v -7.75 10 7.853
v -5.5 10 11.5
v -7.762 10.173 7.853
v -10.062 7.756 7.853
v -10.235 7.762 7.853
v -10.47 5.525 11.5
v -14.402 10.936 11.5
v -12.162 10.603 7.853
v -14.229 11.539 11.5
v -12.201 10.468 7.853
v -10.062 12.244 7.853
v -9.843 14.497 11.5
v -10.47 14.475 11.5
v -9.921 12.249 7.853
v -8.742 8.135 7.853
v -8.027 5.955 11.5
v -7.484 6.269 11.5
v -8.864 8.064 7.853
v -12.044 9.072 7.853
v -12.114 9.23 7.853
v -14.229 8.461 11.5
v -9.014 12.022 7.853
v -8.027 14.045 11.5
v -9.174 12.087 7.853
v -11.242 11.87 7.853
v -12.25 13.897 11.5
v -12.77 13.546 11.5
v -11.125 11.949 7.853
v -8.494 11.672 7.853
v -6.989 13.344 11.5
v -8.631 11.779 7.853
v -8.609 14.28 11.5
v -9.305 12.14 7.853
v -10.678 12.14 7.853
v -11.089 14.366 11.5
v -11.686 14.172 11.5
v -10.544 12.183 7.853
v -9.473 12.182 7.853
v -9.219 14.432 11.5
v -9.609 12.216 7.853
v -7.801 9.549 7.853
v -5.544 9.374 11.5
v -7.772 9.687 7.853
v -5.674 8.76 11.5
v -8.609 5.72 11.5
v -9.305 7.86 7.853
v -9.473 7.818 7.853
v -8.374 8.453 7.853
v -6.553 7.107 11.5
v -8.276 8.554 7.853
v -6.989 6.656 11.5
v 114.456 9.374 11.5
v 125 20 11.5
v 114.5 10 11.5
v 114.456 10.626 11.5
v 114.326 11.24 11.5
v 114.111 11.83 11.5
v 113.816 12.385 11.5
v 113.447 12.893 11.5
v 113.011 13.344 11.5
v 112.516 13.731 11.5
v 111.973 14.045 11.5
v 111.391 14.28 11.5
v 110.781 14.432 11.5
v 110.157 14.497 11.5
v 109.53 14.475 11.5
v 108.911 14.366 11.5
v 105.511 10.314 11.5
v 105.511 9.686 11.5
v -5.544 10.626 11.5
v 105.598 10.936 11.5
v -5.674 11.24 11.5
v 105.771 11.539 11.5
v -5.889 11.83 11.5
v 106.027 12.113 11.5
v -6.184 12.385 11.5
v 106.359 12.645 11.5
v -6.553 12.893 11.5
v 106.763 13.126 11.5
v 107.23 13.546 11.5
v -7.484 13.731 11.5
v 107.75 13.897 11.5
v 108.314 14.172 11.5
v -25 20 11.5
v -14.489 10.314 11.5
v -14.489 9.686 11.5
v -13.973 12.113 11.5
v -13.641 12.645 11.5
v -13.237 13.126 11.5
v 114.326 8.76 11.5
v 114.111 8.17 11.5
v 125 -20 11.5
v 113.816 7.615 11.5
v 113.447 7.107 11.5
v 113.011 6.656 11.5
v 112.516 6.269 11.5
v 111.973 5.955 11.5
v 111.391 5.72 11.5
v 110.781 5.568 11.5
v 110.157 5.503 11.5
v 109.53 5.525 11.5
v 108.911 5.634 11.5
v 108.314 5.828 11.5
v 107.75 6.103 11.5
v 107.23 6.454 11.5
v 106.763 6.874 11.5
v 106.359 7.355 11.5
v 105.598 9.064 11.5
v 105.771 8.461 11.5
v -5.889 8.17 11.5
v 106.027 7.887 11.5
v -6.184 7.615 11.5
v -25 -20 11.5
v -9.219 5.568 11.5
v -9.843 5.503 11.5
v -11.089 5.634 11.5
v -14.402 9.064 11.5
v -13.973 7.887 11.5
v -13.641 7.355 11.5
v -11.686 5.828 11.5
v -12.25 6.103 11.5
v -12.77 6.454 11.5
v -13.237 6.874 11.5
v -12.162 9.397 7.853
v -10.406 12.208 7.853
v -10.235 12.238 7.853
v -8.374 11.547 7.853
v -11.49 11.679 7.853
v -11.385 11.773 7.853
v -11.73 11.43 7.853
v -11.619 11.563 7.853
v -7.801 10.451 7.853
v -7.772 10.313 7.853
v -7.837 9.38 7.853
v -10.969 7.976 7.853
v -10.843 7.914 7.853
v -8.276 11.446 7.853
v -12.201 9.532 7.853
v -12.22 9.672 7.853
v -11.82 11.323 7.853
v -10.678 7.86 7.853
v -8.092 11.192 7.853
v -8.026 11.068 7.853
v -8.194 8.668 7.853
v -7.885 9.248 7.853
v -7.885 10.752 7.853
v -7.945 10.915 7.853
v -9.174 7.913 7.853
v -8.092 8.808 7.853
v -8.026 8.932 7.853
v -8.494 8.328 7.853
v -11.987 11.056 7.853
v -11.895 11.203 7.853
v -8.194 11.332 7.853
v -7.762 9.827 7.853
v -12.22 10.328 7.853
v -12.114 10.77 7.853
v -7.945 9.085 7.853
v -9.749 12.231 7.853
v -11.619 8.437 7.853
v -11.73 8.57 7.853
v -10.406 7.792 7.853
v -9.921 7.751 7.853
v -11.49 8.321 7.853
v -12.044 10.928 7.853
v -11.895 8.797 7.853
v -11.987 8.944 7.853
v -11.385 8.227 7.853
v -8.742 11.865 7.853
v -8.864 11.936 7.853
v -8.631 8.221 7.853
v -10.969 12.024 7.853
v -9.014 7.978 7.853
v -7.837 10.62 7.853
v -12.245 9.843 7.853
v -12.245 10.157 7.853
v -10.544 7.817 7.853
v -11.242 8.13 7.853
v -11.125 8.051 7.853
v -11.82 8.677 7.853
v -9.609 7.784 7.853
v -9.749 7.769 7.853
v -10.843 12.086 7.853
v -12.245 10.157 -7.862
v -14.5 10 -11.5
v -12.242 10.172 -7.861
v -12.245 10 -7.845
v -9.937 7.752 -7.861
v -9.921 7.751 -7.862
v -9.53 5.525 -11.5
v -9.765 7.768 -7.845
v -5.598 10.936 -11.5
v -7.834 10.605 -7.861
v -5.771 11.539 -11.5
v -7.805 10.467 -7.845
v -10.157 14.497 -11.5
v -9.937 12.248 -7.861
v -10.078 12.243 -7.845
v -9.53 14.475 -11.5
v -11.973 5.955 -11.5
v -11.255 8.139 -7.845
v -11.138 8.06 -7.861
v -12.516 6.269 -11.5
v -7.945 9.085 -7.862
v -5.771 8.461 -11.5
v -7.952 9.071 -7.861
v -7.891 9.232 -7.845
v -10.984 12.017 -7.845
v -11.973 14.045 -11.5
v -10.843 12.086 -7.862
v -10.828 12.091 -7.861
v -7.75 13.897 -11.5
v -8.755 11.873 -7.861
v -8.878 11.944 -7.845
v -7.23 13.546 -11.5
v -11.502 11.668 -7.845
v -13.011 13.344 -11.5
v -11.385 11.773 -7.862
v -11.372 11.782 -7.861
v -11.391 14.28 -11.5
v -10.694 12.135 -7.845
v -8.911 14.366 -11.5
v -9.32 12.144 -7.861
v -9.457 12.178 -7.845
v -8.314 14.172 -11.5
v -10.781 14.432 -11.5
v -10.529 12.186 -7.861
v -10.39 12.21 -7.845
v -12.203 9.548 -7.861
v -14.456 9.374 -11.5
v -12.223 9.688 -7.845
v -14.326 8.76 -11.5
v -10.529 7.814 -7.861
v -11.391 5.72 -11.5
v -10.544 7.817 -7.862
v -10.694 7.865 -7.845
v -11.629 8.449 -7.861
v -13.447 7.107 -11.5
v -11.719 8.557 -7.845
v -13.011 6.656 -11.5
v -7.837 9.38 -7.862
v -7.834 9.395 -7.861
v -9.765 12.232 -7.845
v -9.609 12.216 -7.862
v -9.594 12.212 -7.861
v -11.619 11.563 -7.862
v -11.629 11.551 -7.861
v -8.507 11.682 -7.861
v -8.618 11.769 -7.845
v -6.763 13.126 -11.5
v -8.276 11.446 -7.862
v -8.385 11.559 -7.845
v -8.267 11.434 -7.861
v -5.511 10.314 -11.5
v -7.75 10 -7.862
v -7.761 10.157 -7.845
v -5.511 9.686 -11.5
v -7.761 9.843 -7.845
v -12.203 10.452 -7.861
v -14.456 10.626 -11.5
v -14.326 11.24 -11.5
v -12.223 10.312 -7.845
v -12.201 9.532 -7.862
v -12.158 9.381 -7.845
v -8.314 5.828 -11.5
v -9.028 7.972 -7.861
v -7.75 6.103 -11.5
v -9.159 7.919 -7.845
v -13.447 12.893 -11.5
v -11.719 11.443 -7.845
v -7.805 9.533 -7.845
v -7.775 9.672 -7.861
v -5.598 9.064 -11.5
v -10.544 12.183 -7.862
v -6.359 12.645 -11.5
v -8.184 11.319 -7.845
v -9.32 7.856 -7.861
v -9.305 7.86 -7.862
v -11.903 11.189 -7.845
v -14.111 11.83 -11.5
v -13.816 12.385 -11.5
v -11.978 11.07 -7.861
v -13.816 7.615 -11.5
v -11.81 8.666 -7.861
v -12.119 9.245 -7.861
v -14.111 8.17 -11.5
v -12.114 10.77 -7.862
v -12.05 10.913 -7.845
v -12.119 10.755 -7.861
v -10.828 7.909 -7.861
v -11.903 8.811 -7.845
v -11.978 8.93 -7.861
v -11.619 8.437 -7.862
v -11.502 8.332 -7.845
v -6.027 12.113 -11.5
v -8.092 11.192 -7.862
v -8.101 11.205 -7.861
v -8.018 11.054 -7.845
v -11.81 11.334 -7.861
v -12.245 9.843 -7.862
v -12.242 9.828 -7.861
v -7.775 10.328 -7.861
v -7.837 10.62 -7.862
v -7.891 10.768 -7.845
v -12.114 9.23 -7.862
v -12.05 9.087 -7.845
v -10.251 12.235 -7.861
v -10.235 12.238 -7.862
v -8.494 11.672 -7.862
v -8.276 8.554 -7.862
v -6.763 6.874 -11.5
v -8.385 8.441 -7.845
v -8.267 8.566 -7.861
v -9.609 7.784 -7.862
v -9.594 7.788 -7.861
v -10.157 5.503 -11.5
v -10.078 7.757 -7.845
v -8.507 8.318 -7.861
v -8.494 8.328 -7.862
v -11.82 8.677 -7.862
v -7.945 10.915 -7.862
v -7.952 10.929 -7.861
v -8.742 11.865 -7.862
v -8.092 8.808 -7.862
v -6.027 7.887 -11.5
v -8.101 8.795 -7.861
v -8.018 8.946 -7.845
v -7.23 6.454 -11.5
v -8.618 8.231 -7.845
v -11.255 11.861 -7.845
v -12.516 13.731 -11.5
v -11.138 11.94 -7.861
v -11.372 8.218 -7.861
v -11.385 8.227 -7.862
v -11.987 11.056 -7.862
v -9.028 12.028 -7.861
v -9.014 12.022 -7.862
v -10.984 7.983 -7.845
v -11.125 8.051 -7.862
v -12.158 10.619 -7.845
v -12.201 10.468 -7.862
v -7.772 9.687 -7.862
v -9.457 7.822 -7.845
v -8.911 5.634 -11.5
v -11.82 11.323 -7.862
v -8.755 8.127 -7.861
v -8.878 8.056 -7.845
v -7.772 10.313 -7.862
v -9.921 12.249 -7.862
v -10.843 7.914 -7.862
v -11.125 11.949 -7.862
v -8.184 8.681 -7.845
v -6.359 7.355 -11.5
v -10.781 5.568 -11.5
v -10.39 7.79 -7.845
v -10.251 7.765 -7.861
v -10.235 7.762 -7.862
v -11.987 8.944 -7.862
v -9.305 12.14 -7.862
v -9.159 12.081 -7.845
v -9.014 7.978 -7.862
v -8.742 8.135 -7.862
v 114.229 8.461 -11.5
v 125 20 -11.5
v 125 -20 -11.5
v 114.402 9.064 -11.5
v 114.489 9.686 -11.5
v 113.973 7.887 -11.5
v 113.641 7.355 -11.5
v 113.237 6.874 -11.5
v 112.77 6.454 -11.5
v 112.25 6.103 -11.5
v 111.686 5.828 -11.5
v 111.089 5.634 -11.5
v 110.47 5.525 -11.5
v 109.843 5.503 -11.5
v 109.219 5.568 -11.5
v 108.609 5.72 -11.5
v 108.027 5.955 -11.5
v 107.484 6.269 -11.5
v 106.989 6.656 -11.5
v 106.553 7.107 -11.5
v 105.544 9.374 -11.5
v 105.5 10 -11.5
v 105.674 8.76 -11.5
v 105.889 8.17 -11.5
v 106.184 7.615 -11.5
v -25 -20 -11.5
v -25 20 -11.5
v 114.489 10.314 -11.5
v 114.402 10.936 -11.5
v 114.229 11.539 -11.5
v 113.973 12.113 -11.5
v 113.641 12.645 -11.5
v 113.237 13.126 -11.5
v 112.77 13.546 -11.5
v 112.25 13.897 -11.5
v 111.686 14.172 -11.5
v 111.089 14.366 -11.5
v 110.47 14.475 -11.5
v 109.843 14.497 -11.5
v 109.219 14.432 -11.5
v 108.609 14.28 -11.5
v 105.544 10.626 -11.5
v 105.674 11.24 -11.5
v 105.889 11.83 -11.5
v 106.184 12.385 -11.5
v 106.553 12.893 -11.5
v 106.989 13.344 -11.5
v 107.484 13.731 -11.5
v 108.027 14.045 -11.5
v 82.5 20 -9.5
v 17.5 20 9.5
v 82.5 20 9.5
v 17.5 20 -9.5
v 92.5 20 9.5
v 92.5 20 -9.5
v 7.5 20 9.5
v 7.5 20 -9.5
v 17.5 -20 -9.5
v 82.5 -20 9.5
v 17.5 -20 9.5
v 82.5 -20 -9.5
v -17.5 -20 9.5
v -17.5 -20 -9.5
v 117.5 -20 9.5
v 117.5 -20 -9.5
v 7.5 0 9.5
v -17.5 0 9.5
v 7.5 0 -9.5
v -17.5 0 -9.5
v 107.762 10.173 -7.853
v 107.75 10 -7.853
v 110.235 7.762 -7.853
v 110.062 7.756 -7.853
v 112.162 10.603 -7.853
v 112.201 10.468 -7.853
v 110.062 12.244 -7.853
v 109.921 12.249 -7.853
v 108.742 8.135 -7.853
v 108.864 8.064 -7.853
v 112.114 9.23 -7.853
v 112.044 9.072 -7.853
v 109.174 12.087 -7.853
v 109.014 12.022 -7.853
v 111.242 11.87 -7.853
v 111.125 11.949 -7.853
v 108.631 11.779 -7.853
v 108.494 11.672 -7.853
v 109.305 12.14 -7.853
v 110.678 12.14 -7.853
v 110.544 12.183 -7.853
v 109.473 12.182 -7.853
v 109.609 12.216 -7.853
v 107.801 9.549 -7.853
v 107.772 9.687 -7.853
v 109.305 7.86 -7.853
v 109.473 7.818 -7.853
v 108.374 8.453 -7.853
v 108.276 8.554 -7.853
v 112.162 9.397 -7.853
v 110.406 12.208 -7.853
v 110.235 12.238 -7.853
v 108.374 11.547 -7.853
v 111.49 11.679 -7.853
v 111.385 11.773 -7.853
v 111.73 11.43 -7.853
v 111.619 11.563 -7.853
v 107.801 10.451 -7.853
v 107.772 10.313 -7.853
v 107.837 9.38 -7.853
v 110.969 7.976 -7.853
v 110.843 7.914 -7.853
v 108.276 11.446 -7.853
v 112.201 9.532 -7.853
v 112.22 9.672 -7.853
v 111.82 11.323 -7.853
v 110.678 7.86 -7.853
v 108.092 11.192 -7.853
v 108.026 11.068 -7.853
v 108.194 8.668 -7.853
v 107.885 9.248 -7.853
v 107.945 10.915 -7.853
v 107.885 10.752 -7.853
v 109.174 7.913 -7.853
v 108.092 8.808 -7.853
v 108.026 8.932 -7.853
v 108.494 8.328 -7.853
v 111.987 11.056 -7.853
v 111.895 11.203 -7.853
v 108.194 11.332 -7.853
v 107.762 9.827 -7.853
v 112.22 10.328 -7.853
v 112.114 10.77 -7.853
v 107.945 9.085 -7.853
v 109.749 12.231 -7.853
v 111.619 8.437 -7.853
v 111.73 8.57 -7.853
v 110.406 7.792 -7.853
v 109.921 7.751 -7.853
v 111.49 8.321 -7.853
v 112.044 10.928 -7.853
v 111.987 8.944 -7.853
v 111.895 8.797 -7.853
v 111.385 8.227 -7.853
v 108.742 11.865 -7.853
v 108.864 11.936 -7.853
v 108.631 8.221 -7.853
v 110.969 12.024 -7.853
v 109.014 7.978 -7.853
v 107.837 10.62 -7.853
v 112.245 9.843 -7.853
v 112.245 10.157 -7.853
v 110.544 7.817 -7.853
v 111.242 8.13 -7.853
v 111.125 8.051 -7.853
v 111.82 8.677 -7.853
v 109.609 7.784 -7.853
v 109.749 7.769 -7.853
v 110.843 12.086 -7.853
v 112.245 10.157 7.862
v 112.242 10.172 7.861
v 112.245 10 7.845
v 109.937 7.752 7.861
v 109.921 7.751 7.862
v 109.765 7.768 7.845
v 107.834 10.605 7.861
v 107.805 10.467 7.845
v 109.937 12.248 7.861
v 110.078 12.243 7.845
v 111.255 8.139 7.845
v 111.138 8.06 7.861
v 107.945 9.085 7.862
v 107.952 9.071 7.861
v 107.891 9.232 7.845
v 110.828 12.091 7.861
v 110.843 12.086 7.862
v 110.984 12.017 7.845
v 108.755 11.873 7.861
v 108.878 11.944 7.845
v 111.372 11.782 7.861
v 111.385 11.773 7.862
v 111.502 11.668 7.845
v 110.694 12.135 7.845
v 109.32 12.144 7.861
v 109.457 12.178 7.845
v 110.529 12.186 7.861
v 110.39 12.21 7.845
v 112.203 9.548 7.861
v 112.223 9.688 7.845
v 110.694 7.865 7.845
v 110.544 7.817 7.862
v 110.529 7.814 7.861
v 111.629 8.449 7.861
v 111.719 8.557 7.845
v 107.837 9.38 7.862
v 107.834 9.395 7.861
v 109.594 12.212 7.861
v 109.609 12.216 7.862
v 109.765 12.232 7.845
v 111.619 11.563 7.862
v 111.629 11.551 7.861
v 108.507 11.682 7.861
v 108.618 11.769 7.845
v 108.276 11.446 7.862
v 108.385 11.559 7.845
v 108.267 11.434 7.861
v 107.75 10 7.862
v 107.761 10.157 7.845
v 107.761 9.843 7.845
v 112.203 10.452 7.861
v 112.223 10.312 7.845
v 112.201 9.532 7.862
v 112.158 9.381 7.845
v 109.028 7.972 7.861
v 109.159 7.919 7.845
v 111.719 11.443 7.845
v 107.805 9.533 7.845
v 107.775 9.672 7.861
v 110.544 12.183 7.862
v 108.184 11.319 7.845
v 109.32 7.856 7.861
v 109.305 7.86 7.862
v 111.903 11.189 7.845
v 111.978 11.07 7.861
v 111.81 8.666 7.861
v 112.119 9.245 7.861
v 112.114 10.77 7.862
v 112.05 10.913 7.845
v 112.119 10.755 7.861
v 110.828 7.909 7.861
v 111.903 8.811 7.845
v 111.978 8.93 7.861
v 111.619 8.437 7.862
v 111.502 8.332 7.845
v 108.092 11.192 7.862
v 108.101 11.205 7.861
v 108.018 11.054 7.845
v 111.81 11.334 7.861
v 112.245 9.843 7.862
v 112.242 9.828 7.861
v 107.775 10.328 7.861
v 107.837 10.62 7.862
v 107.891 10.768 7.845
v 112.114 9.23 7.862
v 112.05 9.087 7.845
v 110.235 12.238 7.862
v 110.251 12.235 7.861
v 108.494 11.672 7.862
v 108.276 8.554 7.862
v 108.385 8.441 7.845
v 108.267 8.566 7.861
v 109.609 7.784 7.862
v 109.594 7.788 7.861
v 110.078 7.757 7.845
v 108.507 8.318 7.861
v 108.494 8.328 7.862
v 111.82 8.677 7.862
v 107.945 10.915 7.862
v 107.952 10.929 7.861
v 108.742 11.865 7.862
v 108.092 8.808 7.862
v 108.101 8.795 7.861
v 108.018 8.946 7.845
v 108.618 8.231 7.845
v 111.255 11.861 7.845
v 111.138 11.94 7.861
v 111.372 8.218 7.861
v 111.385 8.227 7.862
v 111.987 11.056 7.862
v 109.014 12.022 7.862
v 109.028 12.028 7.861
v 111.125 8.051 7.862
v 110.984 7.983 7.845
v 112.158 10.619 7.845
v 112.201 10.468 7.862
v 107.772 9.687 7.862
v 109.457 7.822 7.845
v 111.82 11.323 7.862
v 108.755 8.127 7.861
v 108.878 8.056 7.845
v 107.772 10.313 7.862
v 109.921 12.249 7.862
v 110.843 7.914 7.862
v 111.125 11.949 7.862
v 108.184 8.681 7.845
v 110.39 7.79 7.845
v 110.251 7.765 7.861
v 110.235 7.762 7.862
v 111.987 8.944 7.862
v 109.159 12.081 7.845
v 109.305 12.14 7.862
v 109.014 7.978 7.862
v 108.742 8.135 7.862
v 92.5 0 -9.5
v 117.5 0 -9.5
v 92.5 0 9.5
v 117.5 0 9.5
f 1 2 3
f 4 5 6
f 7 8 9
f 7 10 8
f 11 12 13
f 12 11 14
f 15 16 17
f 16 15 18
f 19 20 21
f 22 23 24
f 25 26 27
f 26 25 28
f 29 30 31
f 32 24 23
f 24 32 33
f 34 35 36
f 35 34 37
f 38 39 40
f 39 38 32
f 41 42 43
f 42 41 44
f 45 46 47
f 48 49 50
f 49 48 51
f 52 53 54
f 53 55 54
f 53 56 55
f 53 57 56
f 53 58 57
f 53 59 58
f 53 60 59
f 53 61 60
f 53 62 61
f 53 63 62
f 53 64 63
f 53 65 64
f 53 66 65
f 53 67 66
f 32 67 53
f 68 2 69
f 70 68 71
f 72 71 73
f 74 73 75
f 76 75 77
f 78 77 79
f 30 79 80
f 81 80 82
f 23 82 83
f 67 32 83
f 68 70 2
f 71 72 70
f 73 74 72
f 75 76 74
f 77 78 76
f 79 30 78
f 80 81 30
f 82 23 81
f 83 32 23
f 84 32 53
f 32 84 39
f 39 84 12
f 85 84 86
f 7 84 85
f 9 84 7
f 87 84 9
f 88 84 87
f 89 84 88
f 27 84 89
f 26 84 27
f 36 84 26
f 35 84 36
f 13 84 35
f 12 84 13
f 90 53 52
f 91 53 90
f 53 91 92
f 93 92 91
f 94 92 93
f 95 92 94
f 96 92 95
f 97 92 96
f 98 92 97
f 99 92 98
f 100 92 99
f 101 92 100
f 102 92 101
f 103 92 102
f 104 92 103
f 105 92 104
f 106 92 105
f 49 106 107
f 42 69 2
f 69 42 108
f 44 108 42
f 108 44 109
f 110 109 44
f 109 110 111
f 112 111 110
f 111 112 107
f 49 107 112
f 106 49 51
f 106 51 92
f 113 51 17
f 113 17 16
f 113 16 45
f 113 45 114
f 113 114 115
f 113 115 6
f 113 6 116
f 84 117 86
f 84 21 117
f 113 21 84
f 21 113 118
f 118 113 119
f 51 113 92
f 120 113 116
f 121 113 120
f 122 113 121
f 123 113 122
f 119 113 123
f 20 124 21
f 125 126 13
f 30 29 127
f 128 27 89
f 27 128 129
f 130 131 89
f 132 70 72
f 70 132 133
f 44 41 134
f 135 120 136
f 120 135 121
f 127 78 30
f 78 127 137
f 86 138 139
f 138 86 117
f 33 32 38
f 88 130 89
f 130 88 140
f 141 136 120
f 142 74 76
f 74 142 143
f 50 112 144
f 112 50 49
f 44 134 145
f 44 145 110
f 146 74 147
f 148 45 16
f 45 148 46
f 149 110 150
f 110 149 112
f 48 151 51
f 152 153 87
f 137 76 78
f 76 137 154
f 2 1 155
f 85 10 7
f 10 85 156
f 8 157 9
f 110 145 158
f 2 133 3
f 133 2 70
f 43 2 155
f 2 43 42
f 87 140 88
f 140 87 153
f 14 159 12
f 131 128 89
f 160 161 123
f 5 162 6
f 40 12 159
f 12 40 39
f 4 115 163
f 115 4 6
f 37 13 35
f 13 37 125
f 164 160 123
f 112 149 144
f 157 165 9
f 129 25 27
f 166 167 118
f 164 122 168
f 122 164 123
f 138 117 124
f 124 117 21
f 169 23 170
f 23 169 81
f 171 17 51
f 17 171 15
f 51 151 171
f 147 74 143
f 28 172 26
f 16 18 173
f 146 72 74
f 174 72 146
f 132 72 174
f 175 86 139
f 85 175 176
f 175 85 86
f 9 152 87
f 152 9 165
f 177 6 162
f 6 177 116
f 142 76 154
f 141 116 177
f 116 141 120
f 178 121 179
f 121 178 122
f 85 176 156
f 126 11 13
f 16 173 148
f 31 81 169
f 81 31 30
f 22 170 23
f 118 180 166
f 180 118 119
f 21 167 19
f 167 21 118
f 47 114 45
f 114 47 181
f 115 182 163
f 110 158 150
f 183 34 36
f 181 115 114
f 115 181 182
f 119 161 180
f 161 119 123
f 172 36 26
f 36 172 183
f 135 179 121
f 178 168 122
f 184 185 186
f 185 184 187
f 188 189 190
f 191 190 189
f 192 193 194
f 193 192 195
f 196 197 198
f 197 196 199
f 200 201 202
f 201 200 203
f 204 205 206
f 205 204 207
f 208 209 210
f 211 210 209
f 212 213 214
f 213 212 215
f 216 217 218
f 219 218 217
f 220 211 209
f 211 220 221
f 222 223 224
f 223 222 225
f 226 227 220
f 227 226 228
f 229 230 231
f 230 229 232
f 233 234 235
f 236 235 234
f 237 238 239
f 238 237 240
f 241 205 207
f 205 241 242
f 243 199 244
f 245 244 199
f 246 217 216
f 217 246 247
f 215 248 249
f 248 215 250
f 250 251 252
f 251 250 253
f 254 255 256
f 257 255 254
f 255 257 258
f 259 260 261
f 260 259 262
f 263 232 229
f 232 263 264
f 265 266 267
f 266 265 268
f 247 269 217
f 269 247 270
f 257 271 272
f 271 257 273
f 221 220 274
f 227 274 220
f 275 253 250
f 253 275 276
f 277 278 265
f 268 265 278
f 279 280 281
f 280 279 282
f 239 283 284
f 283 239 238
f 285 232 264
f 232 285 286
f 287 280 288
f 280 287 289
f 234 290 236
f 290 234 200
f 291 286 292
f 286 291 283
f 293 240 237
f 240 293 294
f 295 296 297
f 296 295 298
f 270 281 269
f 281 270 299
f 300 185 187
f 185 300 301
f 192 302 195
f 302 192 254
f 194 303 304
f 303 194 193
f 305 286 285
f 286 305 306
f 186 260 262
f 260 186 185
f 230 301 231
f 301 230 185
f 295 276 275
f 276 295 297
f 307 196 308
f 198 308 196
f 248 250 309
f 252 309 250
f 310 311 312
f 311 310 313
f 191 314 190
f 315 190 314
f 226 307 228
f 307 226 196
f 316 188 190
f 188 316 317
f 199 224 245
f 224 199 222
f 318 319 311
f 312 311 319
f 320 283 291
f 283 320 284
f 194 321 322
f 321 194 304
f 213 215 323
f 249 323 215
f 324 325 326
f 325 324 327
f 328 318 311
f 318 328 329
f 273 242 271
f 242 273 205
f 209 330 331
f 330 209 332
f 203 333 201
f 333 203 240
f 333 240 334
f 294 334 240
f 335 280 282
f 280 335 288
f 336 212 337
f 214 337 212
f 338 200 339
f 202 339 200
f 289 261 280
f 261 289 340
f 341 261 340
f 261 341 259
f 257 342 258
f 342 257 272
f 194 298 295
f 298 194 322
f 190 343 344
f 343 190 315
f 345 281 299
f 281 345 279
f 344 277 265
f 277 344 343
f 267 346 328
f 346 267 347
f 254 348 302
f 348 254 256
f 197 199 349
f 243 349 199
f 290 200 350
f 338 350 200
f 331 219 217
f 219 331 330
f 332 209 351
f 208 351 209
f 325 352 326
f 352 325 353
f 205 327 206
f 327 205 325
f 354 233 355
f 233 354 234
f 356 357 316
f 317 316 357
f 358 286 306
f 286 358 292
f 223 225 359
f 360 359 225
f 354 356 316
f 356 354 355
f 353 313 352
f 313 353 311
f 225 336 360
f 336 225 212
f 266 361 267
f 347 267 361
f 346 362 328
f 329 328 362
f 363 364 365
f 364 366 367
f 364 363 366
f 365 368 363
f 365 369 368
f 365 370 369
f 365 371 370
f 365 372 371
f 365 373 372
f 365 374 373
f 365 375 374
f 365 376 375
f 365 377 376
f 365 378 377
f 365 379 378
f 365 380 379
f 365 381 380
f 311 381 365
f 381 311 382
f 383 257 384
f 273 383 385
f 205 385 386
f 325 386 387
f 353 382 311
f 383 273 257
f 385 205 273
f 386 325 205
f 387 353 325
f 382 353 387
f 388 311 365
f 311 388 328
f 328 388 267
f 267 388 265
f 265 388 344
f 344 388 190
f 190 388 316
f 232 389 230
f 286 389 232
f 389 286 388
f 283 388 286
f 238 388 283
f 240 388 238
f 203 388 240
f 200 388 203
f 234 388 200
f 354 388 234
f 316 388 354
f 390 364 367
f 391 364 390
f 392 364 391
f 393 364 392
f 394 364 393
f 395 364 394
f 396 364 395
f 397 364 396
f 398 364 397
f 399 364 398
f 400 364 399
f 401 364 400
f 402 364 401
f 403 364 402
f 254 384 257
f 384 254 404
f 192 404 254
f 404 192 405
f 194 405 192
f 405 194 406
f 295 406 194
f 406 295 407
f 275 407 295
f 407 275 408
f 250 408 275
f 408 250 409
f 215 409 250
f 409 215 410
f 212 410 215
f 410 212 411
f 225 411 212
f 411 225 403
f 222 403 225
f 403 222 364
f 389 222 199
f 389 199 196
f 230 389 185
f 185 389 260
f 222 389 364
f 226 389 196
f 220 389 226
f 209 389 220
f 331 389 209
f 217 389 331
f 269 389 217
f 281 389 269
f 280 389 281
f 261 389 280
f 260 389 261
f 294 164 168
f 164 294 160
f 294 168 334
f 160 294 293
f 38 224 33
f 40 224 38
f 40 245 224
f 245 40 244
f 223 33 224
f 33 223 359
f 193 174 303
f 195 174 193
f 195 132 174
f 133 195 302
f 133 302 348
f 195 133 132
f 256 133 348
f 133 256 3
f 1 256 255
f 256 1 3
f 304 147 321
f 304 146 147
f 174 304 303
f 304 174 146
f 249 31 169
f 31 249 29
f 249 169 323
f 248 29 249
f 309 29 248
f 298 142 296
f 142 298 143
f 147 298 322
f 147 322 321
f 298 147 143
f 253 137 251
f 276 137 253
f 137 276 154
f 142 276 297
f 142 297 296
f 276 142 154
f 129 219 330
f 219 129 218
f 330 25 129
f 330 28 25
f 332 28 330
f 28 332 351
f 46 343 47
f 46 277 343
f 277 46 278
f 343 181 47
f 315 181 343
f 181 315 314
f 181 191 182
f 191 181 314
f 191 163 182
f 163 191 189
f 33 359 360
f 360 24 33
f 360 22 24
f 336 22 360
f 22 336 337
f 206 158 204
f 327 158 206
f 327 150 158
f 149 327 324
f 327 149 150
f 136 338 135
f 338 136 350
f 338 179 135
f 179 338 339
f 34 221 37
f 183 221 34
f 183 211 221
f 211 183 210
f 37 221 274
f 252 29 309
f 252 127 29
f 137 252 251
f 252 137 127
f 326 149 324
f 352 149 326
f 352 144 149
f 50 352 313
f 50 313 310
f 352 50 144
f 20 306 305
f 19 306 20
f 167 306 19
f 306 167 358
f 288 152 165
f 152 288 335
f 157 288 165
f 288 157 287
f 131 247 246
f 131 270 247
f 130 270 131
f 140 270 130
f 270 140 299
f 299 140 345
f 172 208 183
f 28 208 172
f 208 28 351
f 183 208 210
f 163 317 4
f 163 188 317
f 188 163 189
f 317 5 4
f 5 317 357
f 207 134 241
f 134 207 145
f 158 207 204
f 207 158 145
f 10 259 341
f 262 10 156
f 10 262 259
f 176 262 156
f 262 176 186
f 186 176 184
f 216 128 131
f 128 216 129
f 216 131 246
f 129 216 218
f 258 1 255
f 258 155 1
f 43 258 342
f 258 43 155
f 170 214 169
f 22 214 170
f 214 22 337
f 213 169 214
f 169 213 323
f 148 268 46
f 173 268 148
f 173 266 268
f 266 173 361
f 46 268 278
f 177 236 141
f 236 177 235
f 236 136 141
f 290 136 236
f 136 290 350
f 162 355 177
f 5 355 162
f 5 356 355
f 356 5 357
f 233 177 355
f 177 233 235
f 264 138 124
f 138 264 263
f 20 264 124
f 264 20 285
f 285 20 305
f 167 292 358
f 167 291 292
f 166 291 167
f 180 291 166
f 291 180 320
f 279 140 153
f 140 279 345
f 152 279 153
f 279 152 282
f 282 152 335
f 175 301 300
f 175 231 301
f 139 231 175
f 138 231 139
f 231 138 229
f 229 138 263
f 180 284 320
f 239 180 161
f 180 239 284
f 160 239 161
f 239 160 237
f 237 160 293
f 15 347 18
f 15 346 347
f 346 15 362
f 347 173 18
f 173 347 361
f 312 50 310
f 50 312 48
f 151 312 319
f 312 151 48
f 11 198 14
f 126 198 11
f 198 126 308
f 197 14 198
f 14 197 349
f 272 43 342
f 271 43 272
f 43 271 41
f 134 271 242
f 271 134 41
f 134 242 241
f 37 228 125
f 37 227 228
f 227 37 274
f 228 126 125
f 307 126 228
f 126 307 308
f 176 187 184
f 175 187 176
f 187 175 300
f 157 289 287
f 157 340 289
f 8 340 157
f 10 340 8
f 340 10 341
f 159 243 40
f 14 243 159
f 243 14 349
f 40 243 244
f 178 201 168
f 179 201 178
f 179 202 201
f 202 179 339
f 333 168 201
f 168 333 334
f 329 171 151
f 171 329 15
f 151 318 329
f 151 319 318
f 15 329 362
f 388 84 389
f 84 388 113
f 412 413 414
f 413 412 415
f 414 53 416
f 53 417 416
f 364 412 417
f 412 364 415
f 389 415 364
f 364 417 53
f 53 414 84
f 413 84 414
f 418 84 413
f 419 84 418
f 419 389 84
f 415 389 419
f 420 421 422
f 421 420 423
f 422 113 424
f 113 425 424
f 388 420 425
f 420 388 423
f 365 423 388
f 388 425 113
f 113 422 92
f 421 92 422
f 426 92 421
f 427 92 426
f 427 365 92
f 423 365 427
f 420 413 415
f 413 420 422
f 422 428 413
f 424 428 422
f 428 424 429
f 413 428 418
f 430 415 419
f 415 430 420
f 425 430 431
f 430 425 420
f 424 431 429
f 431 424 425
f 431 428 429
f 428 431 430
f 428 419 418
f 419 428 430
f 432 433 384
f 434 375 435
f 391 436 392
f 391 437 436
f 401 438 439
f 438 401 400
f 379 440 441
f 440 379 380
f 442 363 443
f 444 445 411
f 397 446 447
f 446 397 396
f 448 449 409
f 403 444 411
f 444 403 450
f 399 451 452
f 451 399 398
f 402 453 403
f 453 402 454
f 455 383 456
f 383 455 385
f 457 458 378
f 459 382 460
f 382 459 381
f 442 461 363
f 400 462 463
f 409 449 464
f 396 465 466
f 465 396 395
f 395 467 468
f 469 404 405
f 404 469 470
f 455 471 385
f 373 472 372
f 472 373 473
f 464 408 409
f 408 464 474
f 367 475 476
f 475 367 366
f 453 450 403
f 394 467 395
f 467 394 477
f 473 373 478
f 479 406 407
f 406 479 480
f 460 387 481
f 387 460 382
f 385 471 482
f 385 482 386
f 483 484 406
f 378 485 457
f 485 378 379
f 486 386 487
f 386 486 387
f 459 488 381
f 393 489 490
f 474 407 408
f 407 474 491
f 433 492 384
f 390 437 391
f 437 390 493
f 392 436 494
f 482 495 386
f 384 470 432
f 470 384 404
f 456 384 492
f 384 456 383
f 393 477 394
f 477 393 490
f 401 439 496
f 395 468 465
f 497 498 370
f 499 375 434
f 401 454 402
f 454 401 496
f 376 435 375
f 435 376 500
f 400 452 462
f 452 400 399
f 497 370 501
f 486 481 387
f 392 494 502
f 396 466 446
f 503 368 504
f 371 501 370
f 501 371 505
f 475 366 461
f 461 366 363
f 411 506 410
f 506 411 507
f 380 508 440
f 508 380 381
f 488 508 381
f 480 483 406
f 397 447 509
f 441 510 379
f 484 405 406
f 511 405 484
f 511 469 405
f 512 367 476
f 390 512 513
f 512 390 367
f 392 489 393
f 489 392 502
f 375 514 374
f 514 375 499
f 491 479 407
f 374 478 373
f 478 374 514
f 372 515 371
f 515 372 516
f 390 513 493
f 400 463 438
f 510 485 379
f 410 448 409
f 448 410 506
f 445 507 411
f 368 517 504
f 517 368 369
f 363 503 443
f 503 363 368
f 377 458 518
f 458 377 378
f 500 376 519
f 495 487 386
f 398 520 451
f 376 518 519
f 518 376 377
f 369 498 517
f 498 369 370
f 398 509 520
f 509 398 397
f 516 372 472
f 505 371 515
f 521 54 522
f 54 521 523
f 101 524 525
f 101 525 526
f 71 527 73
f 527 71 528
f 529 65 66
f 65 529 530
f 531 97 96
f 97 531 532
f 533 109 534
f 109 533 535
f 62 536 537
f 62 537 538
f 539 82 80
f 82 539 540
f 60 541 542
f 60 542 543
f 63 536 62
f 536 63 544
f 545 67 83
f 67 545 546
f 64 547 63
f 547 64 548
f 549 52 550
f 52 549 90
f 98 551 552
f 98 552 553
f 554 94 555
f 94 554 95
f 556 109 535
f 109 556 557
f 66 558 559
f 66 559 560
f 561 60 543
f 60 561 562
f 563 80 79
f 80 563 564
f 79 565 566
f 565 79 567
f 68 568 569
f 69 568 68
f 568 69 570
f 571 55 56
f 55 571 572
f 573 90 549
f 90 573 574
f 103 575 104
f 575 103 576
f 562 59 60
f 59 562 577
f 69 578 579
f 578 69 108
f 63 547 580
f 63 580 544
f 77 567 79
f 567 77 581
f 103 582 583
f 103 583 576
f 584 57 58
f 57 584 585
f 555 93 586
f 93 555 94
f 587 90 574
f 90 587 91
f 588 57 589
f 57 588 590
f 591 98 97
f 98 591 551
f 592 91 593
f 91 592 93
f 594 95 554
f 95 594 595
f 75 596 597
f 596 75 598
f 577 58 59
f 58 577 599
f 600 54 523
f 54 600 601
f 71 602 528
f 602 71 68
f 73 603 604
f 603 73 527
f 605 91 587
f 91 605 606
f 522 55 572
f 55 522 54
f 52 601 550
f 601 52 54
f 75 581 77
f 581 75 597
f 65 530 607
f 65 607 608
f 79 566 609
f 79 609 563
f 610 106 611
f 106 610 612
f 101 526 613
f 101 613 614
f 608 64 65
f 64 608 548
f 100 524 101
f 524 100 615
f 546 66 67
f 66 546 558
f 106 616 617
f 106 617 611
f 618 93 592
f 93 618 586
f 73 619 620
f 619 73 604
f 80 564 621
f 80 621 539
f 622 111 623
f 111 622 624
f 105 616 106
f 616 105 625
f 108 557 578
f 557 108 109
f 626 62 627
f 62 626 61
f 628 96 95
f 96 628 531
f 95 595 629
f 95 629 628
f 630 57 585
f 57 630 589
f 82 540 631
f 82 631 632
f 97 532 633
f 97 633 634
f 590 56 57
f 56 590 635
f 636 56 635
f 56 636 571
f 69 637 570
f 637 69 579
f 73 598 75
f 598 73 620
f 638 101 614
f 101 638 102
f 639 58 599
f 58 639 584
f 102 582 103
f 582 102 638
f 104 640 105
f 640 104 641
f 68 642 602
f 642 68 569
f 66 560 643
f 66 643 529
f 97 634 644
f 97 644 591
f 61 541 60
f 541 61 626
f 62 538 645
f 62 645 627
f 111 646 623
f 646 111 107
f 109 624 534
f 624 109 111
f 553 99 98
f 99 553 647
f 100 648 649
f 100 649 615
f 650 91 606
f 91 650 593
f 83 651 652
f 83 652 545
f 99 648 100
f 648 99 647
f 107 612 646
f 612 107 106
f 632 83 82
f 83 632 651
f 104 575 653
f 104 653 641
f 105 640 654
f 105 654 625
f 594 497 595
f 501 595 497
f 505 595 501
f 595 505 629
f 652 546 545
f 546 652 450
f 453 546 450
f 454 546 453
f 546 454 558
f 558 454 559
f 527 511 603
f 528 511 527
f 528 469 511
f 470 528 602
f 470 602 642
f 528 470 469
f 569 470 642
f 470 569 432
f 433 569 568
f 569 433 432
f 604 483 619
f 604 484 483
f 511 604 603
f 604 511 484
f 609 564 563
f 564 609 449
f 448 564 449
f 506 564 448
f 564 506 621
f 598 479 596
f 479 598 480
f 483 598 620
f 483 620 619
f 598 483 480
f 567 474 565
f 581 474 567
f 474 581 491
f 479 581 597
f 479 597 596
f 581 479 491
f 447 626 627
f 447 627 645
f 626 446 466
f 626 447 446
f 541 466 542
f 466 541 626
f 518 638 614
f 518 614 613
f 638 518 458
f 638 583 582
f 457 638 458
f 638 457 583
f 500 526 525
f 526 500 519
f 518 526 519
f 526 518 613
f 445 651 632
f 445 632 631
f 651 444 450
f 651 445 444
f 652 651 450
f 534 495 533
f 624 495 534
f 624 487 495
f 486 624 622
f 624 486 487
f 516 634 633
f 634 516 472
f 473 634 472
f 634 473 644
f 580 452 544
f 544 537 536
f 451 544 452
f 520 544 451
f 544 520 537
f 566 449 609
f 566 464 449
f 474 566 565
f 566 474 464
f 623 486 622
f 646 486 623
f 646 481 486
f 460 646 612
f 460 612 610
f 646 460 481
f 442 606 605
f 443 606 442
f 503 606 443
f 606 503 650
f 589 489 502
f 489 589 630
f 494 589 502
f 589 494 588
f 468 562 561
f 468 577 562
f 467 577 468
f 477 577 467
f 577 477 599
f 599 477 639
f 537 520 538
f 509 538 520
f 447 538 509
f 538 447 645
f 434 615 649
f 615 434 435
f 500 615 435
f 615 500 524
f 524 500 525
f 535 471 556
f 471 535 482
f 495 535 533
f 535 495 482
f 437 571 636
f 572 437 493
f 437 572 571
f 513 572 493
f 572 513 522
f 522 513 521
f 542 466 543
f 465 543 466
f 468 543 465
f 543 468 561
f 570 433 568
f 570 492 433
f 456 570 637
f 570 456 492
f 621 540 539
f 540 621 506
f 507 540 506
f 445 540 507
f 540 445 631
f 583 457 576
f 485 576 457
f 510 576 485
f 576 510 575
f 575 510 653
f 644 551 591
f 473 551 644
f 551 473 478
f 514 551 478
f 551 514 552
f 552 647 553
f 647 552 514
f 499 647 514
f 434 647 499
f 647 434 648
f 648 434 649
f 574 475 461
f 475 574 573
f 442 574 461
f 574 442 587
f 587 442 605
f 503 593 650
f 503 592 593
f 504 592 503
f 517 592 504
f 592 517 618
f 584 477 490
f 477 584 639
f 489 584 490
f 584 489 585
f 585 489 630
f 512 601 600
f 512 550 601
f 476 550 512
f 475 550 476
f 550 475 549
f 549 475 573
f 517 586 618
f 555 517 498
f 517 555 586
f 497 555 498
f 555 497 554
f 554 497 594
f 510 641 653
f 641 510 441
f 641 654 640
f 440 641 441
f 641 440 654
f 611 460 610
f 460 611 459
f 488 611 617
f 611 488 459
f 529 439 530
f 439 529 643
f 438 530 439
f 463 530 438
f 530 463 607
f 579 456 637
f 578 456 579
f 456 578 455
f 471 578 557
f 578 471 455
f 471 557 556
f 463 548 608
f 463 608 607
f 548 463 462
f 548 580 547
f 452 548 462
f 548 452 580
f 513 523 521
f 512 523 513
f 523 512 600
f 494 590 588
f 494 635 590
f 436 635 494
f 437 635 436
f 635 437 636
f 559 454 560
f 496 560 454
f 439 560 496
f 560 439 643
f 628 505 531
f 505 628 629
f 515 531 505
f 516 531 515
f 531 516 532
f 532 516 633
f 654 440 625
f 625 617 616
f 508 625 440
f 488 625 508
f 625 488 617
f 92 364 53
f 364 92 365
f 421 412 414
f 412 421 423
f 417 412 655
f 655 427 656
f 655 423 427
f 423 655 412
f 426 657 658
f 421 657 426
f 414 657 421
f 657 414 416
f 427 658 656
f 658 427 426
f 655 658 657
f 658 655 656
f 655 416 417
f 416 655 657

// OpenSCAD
$fn = 45;
height = 23;
depth = 40;

servoHolder_double();

module servoHolder_double(){
	servoHolder();
	translate([100, 0, 0])
		rotate([0, 180, 0])
			servoHolder();
	
	translate([50, 0, 0])
		cube([50, depth, height], center=true);
}

module servoHolder(){
	innerHeight = 19;
	servoHeight = 2;
	difference(){
		cube([50, depth, height], center=true);
		translate([0, -10, (innerHeight-height)/2+servoHeight])
			#cube([35, 20, innerHeight], center=true);
		translate([12.5, 0, (innerHeight-height)/2+servoHeight])
			#cube([10, depth, innerHeight], center=true);
		
		translate([-10, 10, 0]){
			screwHole();
		}
	}

	module screwHole(){
		coneHeight = 4.7;
		#cylinder(d=4.5, h=height, center=true);
		zAbs = height/2-coneHeight;
		for(yFlip = [0, 180]){
			rotate([0, yFlip, 0])
				translate([0, 0, height/2-coneHeight])
					#cylinder(d1=3.2, d2=9, h=coneHeight);
		}
	}
}
